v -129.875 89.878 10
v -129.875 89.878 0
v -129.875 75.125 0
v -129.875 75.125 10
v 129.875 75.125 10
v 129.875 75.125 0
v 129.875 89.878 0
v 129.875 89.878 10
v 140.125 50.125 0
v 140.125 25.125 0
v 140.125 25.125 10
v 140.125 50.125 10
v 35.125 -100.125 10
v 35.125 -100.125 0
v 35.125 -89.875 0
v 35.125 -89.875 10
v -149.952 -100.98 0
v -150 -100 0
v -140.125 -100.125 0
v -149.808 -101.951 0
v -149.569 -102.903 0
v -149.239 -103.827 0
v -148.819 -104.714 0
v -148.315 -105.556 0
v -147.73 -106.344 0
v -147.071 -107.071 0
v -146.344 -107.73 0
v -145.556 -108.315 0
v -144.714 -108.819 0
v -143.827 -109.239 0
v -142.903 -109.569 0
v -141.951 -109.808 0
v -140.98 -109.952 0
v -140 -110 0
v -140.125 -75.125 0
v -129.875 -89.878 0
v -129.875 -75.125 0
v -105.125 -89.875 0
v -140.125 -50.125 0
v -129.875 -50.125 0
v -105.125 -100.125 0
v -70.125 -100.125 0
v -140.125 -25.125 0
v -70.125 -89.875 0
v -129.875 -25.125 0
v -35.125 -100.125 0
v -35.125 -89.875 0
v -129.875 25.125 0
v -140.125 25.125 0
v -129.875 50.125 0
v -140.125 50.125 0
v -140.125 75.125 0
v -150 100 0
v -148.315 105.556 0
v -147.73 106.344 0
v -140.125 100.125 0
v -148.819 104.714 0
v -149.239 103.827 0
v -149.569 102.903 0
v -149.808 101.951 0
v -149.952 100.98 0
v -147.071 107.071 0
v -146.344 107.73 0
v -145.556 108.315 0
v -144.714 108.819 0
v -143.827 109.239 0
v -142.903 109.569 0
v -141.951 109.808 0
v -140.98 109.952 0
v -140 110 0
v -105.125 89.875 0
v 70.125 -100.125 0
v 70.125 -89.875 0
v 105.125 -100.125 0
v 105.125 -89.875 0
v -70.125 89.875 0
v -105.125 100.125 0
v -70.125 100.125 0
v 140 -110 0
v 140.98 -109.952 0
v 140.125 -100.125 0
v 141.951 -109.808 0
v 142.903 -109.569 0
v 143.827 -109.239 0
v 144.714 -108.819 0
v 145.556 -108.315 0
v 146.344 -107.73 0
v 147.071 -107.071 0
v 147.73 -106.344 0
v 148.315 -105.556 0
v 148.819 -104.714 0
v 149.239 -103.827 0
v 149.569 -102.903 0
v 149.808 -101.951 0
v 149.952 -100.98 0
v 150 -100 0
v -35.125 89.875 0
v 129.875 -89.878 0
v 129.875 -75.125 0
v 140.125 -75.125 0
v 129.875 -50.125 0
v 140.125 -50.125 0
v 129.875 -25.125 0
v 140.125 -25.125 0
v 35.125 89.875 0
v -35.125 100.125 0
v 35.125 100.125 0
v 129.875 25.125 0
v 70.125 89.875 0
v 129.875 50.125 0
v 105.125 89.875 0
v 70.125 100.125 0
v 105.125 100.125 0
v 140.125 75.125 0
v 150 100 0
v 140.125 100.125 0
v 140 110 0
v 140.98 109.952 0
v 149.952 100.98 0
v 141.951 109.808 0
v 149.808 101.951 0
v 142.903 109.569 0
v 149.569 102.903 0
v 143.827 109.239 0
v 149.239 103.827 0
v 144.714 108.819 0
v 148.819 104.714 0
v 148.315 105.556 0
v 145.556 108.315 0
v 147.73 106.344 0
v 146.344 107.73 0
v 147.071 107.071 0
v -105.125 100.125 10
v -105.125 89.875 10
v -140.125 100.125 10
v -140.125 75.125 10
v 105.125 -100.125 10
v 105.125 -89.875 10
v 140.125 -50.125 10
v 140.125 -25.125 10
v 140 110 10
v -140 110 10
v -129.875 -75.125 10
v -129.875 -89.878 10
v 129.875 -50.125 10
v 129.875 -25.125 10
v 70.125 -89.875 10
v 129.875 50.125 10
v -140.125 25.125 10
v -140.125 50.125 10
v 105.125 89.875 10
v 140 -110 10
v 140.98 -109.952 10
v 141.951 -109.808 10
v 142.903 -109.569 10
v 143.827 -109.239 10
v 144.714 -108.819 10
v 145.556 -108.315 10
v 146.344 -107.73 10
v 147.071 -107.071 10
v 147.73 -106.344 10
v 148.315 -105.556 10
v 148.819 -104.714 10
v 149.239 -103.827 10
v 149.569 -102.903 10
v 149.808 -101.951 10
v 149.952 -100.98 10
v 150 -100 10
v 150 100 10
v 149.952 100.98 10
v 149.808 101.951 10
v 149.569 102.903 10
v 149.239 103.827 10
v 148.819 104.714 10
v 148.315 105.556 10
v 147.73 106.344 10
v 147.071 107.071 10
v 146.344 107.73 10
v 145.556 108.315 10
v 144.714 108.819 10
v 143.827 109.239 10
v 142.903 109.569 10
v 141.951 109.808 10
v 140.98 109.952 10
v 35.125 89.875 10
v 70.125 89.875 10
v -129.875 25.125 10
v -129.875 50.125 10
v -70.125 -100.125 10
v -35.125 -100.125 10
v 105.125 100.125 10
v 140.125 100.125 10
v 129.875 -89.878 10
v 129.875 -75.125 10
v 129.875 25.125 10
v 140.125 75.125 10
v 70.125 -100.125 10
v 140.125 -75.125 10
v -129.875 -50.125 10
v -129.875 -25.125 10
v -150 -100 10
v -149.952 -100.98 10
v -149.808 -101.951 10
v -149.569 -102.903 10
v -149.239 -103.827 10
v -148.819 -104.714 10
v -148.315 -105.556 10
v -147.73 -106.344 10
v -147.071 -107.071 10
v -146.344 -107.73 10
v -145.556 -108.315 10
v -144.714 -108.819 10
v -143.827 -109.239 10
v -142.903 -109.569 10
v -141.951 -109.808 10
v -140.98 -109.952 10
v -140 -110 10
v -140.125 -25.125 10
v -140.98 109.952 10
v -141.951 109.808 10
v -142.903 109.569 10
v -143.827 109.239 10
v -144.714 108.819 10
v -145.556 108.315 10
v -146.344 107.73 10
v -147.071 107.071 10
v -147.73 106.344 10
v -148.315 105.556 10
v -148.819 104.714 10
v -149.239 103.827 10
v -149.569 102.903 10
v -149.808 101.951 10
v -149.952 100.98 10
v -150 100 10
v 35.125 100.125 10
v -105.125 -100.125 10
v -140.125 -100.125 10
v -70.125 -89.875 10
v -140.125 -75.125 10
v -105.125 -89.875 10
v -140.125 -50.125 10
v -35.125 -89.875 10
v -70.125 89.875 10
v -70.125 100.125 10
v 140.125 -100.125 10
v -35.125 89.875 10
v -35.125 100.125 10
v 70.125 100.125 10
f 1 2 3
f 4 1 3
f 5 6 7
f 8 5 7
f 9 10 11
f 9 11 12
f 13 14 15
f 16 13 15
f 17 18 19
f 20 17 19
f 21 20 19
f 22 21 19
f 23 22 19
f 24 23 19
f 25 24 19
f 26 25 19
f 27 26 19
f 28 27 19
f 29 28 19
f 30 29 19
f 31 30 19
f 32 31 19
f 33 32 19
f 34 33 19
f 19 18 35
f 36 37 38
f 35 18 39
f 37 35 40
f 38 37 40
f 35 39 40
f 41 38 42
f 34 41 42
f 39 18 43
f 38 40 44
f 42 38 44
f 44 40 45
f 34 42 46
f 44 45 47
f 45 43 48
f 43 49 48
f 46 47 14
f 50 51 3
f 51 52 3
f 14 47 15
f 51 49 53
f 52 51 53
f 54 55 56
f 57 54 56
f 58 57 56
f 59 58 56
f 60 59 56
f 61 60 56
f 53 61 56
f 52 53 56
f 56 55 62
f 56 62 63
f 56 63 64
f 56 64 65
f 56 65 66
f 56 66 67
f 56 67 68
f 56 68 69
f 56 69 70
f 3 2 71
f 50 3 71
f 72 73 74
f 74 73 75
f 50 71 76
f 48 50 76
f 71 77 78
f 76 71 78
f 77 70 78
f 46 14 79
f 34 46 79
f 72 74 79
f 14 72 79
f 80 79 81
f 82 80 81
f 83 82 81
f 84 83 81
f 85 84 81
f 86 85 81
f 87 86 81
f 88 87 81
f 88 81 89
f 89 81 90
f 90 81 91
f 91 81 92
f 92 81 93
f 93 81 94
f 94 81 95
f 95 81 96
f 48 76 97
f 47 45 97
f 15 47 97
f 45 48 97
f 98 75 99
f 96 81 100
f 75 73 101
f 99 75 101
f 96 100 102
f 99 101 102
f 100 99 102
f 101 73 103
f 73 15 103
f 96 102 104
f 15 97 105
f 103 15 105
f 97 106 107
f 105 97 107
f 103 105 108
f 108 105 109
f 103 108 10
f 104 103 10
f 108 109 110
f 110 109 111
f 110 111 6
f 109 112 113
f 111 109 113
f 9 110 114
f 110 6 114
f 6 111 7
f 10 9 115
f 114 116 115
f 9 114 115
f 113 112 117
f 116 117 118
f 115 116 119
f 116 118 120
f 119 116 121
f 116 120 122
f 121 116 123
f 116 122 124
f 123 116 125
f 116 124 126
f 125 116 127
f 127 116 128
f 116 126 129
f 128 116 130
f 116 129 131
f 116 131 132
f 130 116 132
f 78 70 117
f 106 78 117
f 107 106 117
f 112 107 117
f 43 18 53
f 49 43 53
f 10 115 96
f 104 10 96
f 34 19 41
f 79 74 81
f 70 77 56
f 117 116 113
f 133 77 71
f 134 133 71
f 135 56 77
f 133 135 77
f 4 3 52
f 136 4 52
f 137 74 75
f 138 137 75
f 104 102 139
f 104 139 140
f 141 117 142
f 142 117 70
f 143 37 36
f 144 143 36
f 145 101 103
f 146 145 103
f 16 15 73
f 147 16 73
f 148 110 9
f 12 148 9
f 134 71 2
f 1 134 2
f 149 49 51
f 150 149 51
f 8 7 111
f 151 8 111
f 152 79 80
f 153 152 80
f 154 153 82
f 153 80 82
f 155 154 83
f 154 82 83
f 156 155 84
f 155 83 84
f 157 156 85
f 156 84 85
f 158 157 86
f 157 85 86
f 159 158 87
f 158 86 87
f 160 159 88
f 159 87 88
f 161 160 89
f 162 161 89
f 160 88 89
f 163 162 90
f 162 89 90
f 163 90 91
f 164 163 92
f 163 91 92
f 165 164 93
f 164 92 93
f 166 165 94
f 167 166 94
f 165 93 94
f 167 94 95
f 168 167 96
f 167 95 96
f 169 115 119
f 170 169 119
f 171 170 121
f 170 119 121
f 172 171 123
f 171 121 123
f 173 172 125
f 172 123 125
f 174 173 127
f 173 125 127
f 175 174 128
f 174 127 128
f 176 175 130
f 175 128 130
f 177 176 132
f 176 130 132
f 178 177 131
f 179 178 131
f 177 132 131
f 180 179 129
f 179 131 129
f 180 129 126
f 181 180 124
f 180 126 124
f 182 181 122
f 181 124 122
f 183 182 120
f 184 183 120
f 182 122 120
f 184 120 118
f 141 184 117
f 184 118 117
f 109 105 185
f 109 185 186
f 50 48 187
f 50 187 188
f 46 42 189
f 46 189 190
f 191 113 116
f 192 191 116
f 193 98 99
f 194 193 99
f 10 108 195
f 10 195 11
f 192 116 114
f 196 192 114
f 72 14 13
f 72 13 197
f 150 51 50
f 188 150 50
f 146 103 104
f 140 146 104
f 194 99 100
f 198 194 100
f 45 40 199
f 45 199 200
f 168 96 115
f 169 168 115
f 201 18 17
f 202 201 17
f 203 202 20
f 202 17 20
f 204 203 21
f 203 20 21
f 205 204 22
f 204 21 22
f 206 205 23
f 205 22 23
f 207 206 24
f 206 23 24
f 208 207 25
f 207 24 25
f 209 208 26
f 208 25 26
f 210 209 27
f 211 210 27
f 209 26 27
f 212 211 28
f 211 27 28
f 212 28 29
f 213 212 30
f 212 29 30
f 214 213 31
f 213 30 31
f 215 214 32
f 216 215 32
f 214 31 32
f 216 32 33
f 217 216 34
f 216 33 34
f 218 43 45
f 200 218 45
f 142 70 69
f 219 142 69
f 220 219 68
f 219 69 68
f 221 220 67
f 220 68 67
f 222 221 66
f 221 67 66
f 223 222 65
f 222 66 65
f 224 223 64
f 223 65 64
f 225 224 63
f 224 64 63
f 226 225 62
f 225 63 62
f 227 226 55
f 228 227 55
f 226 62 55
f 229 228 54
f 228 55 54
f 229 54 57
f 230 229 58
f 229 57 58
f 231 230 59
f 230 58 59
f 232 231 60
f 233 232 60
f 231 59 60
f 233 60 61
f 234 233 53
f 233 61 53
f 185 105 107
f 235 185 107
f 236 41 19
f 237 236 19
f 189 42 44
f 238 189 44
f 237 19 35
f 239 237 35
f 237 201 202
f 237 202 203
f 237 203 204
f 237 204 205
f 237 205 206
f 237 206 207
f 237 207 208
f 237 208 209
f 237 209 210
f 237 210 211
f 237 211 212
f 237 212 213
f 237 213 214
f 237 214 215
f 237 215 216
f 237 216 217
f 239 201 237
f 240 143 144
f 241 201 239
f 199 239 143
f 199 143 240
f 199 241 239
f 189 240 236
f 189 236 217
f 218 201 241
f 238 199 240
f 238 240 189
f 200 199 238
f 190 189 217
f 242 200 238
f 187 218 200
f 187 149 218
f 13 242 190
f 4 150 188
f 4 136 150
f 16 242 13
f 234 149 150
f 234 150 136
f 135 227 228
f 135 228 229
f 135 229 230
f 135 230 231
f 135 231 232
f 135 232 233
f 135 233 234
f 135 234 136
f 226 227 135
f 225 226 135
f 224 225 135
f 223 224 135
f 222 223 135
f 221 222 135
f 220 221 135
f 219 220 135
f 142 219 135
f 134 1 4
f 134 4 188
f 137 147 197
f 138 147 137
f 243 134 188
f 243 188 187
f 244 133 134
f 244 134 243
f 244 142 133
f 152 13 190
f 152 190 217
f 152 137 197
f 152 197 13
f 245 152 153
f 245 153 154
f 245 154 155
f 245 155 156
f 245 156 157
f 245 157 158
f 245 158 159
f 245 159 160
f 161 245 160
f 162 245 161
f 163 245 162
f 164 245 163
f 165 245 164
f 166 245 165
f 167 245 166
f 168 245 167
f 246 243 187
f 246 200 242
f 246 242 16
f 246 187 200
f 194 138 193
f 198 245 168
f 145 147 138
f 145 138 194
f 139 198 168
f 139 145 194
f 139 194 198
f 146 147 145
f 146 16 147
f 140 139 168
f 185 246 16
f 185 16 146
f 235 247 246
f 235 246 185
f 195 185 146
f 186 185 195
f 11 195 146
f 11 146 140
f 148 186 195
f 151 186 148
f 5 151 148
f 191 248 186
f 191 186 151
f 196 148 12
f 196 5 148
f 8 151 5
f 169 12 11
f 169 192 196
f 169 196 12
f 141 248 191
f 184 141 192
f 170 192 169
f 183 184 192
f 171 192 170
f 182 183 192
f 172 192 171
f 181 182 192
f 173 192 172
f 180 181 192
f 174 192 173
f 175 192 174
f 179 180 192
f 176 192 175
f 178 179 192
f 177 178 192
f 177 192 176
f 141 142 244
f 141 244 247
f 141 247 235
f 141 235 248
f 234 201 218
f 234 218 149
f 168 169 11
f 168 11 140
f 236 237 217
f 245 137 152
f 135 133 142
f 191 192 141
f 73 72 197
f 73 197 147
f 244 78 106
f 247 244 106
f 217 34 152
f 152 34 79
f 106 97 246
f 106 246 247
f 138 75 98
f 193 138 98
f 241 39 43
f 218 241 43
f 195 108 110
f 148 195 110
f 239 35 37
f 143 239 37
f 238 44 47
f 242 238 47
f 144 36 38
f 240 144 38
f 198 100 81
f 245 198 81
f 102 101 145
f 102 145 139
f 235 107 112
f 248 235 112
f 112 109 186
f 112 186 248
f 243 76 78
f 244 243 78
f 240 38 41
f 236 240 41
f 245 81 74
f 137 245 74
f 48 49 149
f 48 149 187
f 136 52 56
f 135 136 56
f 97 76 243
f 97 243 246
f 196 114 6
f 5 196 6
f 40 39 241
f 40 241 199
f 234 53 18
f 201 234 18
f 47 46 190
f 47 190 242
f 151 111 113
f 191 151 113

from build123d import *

# Parameters (mm, degrees)
F0_W     = 35
F0_H     = 10.25
F0_W_2   = 10.25
F0_H_2   = 25
F1_DEPTH = 10


with BuildPart() as f1:
    # F0 (on Top) → F1 (new body)
    with BuildSketch(Plane.XY):
        with BuildLine():
            Line((140, 110), (-140, 110))
            ThreePointArc((-140, 110), (-147.071068, 107.071068), (-150, 100))
            Line((-150, 100), (-150, -100))
            ThreePointArc((-150, -100), (-147.071068, -107.071068), (-140, -110))
            Line((-140, -110), (140, -110))
            ThreePointArc((140, -110), (147.071068, -107.071068), (150, -100))
            Line((150, -100), (150, 100))
            ThreePointArc((150, 100), (147.071068, 107.071068), (140, 110))
        make_face()
        Polygon((-105.125, -100.125), (-140.125, -100.125), (-140.125, -75.125), (-129.875, -75.125), (-129.875, -89.878049), (-105.125, -89.875), align=None, mode=Mode.SUBTRACT)
        with Locations((-52.625, -95)):
            Rectangle(F0_W, F0_H, mode=Mode.SUBTRACT)
        with Locations((-135, -37.625)):
            Rectangle(F0_W_2, F0_H_2, mode=Mode.SUBTRACT)
        with Locations((52.625, -95)):
            Rectangle(F0_W, F0_H, mode=Mode.SUBTRACT)
        Polygon((129.875, -75.125), (140.125, -75.125), (140.125, -100.125), (105.125, -100.125), (105.125, -89.875), (129.875, -89.878049), align=None, mode=Mode.SUBTRACT)
        with Locations((135, -37.625)):
            Rectangle(F0_W_2, F0_H_2, mode=Mode.SUBTRACT)
        with Locations((-135, 37.625)):
            Rectangle(F0_W_2, F0_H_2, mode=Mode.SUBTRACT)
        Polygon((-129.875, 75.125), (-140.125, 75.125), (-140.125, 100.125), (-105.125, 100.125), (-105.125, 89.875), (-129.875, 89.878049), align=None, mode=Mode.SUBTRACT)
        with Locations((-52.625, 95)):
            Rectangle(F0_W, F0_H, mode=Mode.SUBTRACT)
        with Locations((135, 37.625)):
            Rectangle(F0_W_2, F0_H_2, mode=Mode.SUBTRACT)
        with Locations((52.625, 95)):
            Rectangle(F0_W, F0_H, mode=Mode.SUBTRACT)
        Polygon((105.125, 89.875), (105.125, 100.125), (140.125, 100.125), (140.125, 75.125), (129.875, 75.125), (129.875, 89.878049), align=None, mode=Mode.SUBTRACT)
    extrude(amount=F1_DEPTH)


solid = f1.part
